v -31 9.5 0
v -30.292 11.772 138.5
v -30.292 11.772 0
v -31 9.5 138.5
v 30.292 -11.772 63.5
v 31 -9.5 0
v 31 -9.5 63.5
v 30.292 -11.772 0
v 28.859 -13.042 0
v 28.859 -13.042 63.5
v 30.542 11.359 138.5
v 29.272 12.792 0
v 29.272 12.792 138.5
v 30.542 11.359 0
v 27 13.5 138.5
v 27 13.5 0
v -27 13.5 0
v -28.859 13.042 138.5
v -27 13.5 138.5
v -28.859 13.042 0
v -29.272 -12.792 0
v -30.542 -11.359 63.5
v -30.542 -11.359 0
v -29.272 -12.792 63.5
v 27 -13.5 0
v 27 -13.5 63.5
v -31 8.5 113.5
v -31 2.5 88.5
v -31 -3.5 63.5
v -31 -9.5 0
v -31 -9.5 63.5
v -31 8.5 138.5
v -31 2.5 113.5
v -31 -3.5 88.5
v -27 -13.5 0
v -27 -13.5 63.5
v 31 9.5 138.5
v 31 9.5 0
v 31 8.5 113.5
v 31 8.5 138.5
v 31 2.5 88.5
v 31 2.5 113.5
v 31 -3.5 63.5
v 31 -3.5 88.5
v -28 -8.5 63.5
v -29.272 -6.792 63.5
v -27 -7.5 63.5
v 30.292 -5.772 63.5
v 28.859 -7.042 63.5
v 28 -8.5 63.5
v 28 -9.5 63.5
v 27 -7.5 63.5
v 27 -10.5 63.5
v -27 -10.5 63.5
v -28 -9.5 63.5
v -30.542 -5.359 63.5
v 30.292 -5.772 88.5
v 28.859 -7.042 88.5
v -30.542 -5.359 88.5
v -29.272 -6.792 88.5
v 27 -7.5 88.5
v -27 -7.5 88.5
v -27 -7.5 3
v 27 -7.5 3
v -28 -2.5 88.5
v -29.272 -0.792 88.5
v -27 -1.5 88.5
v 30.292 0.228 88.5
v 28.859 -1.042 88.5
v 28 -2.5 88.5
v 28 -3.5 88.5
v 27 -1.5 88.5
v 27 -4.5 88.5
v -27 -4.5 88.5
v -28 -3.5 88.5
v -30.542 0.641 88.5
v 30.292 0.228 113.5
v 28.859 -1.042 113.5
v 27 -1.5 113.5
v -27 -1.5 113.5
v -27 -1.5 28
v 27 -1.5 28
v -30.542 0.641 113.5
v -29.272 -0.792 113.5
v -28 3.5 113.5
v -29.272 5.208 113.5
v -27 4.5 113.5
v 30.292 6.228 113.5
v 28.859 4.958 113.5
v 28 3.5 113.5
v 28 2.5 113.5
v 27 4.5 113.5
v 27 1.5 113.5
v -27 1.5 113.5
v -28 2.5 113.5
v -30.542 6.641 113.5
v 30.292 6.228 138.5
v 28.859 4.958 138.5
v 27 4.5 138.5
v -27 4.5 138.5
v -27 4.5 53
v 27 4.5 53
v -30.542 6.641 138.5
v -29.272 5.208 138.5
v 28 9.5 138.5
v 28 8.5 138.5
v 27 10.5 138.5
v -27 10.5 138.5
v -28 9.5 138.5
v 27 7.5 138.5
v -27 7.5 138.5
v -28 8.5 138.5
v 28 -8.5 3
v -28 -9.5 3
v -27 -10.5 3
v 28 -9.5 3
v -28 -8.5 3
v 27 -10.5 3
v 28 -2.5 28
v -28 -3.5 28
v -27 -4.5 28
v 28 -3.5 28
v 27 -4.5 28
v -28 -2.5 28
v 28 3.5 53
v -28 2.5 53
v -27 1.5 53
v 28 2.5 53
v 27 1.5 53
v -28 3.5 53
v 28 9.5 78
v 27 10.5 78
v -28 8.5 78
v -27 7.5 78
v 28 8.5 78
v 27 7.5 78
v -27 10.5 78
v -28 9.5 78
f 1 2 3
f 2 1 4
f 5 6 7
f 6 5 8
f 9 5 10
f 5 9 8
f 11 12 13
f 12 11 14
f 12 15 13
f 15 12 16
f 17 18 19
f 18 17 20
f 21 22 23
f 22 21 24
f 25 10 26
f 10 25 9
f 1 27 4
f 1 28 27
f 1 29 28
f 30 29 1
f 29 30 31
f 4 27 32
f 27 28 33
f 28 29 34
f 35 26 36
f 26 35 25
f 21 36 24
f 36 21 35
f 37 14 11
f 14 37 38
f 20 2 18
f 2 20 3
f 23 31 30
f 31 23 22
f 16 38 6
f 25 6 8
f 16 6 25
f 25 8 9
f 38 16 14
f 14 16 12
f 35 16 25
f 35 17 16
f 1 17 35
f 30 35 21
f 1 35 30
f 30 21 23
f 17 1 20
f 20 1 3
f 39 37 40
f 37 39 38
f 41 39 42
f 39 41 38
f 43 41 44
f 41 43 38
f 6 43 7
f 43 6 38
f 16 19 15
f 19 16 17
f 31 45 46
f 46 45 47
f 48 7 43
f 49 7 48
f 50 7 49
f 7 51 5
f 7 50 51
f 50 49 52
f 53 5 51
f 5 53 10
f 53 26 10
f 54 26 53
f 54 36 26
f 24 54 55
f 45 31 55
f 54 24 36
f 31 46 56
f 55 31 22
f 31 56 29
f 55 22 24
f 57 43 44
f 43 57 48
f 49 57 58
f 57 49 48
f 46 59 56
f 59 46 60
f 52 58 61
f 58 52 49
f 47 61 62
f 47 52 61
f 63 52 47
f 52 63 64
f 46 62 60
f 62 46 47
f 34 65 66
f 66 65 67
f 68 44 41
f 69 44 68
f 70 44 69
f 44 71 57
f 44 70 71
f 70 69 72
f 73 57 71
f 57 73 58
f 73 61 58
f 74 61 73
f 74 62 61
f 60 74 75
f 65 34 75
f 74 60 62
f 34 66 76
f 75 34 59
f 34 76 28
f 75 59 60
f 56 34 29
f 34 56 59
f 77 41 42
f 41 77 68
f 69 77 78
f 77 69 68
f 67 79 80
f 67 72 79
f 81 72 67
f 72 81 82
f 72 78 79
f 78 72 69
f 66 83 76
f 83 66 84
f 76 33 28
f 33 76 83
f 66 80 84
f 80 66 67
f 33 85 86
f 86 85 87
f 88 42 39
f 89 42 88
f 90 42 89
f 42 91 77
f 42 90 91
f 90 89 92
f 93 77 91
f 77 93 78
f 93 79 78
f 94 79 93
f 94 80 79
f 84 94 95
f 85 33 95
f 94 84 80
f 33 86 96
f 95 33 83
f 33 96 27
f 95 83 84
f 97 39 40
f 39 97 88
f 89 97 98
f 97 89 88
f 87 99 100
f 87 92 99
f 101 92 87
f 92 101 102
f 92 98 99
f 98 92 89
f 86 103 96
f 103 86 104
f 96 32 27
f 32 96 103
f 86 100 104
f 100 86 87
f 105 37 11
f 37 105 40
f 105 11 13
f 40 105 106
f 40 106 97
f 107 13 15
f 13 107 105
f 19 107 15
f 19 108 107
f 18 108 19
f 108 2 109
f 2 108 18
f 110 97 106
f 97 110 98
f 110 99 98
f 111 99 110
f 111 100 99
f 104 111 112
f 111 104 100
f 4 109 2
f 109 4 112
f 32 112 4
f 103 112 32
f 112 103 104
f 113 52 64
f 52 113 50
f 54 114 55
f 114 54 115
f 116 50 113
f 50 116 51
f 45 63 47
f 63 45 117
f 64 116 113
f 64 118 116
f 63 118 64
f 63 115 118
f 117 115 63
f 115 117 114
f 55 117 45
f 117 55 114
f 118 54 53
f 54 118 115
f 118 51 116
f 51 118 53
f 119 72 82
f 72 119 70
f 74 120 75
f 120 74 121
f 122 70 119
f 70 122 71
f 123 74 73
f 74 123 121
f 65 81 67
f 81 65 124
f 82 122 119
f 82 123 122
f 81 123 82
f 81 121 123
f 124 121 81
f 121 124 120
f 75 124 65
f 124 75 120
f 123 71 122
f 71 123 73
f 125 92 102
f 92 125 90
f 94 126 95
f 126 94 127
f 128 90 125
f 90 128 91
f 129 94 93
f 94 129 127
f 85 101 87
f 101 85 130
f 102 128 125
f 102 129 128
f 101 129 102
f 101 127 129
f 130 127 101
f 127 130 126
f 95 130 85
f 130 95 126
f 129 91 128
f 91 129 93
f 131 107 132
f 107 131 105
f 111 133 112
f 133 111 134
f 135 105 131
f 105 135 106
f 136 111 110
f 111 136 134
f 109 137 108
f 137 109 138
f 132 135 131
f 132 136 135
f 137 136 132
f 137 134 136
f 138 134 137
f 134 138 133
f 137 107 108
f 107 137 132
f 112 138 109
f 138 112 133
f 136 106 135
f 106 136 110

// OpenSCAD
// most important module, basic building block
module block(x, y, z, radius) {
    // by doing it in 2D and extruding it, we save time and CPU
    linear_extrude(height=z) {
        // by using hull and 2-dimensional for, we could omit this if/else statement for the sake of speed
        if ((y-2*radius) > 0) {
            offset(r=radius)
                square(size=[x-2*radius, y-2*radius], center=true);
        } else {
            // because we cannot make square with size [*,0]
            square(size=[x-2*radius, y], center=true);
            for(i=[-1,1])
                translate([i*(x/2-radius),0])
                    circle(r=radius);
        }
    }
}

module cardholder(size=[85, 54, 1],
                  thickness=3,
                  spacing=1,
                  cards=4,
                  delta=25,
                  visibility=0.3) {
    // make sure we have something to render
    if(cards >= 1 && (len(size) == 2 || len(size) == 3) && size[0] > 0 && size[1] > 0) {
        // sanity the inputs
        size = (len(size) < 3) ? [size[0], size[1], 0] : size;
        spacing = max(spacing,0);
        thickness = max(thickness,0);
        visibility = max(min(visibility,1),0);
        mir=(delta < 0) ? 1 : 0;
        delta = abs(delta);
        extra=size[2]+2*spacing+thickness; // extra size for each card except first (first is extra + thickness)
        mirror([0,mir,0]) {
            difference() {
                // base block
                for(c=[0:(cards-1)]) {
                    translate([0,c*extra/2,0]) // translate it to "the end"
                        block(size[1]+2*spacing+2*thickness, // always the same
                              (cards-c)*extra+thickness, // the higher the card num is, add less extra
                              thickness+spacing+(1-visibility)*size[0]+c*delta, // higher by delta each time
                              spacing+thickness); // always the same
                }
                // remove cards + spacing around them
                for(c=[0:(cards-1)]) {
                    // calculated shift on Y axis by experimenting and a lot of drawings :)
                    // also moved up on Z by thickness + deltas
                    translate([0,c*extra-((cards-1)*extra)/2,thickness+c*delta])
                    #block(size[1]+2*spacing,
                           size[2]+2*spacing,
                           size[0]+2*spacing,
                           spacing);
                }
            }
        }
    }
}

cardholder();
